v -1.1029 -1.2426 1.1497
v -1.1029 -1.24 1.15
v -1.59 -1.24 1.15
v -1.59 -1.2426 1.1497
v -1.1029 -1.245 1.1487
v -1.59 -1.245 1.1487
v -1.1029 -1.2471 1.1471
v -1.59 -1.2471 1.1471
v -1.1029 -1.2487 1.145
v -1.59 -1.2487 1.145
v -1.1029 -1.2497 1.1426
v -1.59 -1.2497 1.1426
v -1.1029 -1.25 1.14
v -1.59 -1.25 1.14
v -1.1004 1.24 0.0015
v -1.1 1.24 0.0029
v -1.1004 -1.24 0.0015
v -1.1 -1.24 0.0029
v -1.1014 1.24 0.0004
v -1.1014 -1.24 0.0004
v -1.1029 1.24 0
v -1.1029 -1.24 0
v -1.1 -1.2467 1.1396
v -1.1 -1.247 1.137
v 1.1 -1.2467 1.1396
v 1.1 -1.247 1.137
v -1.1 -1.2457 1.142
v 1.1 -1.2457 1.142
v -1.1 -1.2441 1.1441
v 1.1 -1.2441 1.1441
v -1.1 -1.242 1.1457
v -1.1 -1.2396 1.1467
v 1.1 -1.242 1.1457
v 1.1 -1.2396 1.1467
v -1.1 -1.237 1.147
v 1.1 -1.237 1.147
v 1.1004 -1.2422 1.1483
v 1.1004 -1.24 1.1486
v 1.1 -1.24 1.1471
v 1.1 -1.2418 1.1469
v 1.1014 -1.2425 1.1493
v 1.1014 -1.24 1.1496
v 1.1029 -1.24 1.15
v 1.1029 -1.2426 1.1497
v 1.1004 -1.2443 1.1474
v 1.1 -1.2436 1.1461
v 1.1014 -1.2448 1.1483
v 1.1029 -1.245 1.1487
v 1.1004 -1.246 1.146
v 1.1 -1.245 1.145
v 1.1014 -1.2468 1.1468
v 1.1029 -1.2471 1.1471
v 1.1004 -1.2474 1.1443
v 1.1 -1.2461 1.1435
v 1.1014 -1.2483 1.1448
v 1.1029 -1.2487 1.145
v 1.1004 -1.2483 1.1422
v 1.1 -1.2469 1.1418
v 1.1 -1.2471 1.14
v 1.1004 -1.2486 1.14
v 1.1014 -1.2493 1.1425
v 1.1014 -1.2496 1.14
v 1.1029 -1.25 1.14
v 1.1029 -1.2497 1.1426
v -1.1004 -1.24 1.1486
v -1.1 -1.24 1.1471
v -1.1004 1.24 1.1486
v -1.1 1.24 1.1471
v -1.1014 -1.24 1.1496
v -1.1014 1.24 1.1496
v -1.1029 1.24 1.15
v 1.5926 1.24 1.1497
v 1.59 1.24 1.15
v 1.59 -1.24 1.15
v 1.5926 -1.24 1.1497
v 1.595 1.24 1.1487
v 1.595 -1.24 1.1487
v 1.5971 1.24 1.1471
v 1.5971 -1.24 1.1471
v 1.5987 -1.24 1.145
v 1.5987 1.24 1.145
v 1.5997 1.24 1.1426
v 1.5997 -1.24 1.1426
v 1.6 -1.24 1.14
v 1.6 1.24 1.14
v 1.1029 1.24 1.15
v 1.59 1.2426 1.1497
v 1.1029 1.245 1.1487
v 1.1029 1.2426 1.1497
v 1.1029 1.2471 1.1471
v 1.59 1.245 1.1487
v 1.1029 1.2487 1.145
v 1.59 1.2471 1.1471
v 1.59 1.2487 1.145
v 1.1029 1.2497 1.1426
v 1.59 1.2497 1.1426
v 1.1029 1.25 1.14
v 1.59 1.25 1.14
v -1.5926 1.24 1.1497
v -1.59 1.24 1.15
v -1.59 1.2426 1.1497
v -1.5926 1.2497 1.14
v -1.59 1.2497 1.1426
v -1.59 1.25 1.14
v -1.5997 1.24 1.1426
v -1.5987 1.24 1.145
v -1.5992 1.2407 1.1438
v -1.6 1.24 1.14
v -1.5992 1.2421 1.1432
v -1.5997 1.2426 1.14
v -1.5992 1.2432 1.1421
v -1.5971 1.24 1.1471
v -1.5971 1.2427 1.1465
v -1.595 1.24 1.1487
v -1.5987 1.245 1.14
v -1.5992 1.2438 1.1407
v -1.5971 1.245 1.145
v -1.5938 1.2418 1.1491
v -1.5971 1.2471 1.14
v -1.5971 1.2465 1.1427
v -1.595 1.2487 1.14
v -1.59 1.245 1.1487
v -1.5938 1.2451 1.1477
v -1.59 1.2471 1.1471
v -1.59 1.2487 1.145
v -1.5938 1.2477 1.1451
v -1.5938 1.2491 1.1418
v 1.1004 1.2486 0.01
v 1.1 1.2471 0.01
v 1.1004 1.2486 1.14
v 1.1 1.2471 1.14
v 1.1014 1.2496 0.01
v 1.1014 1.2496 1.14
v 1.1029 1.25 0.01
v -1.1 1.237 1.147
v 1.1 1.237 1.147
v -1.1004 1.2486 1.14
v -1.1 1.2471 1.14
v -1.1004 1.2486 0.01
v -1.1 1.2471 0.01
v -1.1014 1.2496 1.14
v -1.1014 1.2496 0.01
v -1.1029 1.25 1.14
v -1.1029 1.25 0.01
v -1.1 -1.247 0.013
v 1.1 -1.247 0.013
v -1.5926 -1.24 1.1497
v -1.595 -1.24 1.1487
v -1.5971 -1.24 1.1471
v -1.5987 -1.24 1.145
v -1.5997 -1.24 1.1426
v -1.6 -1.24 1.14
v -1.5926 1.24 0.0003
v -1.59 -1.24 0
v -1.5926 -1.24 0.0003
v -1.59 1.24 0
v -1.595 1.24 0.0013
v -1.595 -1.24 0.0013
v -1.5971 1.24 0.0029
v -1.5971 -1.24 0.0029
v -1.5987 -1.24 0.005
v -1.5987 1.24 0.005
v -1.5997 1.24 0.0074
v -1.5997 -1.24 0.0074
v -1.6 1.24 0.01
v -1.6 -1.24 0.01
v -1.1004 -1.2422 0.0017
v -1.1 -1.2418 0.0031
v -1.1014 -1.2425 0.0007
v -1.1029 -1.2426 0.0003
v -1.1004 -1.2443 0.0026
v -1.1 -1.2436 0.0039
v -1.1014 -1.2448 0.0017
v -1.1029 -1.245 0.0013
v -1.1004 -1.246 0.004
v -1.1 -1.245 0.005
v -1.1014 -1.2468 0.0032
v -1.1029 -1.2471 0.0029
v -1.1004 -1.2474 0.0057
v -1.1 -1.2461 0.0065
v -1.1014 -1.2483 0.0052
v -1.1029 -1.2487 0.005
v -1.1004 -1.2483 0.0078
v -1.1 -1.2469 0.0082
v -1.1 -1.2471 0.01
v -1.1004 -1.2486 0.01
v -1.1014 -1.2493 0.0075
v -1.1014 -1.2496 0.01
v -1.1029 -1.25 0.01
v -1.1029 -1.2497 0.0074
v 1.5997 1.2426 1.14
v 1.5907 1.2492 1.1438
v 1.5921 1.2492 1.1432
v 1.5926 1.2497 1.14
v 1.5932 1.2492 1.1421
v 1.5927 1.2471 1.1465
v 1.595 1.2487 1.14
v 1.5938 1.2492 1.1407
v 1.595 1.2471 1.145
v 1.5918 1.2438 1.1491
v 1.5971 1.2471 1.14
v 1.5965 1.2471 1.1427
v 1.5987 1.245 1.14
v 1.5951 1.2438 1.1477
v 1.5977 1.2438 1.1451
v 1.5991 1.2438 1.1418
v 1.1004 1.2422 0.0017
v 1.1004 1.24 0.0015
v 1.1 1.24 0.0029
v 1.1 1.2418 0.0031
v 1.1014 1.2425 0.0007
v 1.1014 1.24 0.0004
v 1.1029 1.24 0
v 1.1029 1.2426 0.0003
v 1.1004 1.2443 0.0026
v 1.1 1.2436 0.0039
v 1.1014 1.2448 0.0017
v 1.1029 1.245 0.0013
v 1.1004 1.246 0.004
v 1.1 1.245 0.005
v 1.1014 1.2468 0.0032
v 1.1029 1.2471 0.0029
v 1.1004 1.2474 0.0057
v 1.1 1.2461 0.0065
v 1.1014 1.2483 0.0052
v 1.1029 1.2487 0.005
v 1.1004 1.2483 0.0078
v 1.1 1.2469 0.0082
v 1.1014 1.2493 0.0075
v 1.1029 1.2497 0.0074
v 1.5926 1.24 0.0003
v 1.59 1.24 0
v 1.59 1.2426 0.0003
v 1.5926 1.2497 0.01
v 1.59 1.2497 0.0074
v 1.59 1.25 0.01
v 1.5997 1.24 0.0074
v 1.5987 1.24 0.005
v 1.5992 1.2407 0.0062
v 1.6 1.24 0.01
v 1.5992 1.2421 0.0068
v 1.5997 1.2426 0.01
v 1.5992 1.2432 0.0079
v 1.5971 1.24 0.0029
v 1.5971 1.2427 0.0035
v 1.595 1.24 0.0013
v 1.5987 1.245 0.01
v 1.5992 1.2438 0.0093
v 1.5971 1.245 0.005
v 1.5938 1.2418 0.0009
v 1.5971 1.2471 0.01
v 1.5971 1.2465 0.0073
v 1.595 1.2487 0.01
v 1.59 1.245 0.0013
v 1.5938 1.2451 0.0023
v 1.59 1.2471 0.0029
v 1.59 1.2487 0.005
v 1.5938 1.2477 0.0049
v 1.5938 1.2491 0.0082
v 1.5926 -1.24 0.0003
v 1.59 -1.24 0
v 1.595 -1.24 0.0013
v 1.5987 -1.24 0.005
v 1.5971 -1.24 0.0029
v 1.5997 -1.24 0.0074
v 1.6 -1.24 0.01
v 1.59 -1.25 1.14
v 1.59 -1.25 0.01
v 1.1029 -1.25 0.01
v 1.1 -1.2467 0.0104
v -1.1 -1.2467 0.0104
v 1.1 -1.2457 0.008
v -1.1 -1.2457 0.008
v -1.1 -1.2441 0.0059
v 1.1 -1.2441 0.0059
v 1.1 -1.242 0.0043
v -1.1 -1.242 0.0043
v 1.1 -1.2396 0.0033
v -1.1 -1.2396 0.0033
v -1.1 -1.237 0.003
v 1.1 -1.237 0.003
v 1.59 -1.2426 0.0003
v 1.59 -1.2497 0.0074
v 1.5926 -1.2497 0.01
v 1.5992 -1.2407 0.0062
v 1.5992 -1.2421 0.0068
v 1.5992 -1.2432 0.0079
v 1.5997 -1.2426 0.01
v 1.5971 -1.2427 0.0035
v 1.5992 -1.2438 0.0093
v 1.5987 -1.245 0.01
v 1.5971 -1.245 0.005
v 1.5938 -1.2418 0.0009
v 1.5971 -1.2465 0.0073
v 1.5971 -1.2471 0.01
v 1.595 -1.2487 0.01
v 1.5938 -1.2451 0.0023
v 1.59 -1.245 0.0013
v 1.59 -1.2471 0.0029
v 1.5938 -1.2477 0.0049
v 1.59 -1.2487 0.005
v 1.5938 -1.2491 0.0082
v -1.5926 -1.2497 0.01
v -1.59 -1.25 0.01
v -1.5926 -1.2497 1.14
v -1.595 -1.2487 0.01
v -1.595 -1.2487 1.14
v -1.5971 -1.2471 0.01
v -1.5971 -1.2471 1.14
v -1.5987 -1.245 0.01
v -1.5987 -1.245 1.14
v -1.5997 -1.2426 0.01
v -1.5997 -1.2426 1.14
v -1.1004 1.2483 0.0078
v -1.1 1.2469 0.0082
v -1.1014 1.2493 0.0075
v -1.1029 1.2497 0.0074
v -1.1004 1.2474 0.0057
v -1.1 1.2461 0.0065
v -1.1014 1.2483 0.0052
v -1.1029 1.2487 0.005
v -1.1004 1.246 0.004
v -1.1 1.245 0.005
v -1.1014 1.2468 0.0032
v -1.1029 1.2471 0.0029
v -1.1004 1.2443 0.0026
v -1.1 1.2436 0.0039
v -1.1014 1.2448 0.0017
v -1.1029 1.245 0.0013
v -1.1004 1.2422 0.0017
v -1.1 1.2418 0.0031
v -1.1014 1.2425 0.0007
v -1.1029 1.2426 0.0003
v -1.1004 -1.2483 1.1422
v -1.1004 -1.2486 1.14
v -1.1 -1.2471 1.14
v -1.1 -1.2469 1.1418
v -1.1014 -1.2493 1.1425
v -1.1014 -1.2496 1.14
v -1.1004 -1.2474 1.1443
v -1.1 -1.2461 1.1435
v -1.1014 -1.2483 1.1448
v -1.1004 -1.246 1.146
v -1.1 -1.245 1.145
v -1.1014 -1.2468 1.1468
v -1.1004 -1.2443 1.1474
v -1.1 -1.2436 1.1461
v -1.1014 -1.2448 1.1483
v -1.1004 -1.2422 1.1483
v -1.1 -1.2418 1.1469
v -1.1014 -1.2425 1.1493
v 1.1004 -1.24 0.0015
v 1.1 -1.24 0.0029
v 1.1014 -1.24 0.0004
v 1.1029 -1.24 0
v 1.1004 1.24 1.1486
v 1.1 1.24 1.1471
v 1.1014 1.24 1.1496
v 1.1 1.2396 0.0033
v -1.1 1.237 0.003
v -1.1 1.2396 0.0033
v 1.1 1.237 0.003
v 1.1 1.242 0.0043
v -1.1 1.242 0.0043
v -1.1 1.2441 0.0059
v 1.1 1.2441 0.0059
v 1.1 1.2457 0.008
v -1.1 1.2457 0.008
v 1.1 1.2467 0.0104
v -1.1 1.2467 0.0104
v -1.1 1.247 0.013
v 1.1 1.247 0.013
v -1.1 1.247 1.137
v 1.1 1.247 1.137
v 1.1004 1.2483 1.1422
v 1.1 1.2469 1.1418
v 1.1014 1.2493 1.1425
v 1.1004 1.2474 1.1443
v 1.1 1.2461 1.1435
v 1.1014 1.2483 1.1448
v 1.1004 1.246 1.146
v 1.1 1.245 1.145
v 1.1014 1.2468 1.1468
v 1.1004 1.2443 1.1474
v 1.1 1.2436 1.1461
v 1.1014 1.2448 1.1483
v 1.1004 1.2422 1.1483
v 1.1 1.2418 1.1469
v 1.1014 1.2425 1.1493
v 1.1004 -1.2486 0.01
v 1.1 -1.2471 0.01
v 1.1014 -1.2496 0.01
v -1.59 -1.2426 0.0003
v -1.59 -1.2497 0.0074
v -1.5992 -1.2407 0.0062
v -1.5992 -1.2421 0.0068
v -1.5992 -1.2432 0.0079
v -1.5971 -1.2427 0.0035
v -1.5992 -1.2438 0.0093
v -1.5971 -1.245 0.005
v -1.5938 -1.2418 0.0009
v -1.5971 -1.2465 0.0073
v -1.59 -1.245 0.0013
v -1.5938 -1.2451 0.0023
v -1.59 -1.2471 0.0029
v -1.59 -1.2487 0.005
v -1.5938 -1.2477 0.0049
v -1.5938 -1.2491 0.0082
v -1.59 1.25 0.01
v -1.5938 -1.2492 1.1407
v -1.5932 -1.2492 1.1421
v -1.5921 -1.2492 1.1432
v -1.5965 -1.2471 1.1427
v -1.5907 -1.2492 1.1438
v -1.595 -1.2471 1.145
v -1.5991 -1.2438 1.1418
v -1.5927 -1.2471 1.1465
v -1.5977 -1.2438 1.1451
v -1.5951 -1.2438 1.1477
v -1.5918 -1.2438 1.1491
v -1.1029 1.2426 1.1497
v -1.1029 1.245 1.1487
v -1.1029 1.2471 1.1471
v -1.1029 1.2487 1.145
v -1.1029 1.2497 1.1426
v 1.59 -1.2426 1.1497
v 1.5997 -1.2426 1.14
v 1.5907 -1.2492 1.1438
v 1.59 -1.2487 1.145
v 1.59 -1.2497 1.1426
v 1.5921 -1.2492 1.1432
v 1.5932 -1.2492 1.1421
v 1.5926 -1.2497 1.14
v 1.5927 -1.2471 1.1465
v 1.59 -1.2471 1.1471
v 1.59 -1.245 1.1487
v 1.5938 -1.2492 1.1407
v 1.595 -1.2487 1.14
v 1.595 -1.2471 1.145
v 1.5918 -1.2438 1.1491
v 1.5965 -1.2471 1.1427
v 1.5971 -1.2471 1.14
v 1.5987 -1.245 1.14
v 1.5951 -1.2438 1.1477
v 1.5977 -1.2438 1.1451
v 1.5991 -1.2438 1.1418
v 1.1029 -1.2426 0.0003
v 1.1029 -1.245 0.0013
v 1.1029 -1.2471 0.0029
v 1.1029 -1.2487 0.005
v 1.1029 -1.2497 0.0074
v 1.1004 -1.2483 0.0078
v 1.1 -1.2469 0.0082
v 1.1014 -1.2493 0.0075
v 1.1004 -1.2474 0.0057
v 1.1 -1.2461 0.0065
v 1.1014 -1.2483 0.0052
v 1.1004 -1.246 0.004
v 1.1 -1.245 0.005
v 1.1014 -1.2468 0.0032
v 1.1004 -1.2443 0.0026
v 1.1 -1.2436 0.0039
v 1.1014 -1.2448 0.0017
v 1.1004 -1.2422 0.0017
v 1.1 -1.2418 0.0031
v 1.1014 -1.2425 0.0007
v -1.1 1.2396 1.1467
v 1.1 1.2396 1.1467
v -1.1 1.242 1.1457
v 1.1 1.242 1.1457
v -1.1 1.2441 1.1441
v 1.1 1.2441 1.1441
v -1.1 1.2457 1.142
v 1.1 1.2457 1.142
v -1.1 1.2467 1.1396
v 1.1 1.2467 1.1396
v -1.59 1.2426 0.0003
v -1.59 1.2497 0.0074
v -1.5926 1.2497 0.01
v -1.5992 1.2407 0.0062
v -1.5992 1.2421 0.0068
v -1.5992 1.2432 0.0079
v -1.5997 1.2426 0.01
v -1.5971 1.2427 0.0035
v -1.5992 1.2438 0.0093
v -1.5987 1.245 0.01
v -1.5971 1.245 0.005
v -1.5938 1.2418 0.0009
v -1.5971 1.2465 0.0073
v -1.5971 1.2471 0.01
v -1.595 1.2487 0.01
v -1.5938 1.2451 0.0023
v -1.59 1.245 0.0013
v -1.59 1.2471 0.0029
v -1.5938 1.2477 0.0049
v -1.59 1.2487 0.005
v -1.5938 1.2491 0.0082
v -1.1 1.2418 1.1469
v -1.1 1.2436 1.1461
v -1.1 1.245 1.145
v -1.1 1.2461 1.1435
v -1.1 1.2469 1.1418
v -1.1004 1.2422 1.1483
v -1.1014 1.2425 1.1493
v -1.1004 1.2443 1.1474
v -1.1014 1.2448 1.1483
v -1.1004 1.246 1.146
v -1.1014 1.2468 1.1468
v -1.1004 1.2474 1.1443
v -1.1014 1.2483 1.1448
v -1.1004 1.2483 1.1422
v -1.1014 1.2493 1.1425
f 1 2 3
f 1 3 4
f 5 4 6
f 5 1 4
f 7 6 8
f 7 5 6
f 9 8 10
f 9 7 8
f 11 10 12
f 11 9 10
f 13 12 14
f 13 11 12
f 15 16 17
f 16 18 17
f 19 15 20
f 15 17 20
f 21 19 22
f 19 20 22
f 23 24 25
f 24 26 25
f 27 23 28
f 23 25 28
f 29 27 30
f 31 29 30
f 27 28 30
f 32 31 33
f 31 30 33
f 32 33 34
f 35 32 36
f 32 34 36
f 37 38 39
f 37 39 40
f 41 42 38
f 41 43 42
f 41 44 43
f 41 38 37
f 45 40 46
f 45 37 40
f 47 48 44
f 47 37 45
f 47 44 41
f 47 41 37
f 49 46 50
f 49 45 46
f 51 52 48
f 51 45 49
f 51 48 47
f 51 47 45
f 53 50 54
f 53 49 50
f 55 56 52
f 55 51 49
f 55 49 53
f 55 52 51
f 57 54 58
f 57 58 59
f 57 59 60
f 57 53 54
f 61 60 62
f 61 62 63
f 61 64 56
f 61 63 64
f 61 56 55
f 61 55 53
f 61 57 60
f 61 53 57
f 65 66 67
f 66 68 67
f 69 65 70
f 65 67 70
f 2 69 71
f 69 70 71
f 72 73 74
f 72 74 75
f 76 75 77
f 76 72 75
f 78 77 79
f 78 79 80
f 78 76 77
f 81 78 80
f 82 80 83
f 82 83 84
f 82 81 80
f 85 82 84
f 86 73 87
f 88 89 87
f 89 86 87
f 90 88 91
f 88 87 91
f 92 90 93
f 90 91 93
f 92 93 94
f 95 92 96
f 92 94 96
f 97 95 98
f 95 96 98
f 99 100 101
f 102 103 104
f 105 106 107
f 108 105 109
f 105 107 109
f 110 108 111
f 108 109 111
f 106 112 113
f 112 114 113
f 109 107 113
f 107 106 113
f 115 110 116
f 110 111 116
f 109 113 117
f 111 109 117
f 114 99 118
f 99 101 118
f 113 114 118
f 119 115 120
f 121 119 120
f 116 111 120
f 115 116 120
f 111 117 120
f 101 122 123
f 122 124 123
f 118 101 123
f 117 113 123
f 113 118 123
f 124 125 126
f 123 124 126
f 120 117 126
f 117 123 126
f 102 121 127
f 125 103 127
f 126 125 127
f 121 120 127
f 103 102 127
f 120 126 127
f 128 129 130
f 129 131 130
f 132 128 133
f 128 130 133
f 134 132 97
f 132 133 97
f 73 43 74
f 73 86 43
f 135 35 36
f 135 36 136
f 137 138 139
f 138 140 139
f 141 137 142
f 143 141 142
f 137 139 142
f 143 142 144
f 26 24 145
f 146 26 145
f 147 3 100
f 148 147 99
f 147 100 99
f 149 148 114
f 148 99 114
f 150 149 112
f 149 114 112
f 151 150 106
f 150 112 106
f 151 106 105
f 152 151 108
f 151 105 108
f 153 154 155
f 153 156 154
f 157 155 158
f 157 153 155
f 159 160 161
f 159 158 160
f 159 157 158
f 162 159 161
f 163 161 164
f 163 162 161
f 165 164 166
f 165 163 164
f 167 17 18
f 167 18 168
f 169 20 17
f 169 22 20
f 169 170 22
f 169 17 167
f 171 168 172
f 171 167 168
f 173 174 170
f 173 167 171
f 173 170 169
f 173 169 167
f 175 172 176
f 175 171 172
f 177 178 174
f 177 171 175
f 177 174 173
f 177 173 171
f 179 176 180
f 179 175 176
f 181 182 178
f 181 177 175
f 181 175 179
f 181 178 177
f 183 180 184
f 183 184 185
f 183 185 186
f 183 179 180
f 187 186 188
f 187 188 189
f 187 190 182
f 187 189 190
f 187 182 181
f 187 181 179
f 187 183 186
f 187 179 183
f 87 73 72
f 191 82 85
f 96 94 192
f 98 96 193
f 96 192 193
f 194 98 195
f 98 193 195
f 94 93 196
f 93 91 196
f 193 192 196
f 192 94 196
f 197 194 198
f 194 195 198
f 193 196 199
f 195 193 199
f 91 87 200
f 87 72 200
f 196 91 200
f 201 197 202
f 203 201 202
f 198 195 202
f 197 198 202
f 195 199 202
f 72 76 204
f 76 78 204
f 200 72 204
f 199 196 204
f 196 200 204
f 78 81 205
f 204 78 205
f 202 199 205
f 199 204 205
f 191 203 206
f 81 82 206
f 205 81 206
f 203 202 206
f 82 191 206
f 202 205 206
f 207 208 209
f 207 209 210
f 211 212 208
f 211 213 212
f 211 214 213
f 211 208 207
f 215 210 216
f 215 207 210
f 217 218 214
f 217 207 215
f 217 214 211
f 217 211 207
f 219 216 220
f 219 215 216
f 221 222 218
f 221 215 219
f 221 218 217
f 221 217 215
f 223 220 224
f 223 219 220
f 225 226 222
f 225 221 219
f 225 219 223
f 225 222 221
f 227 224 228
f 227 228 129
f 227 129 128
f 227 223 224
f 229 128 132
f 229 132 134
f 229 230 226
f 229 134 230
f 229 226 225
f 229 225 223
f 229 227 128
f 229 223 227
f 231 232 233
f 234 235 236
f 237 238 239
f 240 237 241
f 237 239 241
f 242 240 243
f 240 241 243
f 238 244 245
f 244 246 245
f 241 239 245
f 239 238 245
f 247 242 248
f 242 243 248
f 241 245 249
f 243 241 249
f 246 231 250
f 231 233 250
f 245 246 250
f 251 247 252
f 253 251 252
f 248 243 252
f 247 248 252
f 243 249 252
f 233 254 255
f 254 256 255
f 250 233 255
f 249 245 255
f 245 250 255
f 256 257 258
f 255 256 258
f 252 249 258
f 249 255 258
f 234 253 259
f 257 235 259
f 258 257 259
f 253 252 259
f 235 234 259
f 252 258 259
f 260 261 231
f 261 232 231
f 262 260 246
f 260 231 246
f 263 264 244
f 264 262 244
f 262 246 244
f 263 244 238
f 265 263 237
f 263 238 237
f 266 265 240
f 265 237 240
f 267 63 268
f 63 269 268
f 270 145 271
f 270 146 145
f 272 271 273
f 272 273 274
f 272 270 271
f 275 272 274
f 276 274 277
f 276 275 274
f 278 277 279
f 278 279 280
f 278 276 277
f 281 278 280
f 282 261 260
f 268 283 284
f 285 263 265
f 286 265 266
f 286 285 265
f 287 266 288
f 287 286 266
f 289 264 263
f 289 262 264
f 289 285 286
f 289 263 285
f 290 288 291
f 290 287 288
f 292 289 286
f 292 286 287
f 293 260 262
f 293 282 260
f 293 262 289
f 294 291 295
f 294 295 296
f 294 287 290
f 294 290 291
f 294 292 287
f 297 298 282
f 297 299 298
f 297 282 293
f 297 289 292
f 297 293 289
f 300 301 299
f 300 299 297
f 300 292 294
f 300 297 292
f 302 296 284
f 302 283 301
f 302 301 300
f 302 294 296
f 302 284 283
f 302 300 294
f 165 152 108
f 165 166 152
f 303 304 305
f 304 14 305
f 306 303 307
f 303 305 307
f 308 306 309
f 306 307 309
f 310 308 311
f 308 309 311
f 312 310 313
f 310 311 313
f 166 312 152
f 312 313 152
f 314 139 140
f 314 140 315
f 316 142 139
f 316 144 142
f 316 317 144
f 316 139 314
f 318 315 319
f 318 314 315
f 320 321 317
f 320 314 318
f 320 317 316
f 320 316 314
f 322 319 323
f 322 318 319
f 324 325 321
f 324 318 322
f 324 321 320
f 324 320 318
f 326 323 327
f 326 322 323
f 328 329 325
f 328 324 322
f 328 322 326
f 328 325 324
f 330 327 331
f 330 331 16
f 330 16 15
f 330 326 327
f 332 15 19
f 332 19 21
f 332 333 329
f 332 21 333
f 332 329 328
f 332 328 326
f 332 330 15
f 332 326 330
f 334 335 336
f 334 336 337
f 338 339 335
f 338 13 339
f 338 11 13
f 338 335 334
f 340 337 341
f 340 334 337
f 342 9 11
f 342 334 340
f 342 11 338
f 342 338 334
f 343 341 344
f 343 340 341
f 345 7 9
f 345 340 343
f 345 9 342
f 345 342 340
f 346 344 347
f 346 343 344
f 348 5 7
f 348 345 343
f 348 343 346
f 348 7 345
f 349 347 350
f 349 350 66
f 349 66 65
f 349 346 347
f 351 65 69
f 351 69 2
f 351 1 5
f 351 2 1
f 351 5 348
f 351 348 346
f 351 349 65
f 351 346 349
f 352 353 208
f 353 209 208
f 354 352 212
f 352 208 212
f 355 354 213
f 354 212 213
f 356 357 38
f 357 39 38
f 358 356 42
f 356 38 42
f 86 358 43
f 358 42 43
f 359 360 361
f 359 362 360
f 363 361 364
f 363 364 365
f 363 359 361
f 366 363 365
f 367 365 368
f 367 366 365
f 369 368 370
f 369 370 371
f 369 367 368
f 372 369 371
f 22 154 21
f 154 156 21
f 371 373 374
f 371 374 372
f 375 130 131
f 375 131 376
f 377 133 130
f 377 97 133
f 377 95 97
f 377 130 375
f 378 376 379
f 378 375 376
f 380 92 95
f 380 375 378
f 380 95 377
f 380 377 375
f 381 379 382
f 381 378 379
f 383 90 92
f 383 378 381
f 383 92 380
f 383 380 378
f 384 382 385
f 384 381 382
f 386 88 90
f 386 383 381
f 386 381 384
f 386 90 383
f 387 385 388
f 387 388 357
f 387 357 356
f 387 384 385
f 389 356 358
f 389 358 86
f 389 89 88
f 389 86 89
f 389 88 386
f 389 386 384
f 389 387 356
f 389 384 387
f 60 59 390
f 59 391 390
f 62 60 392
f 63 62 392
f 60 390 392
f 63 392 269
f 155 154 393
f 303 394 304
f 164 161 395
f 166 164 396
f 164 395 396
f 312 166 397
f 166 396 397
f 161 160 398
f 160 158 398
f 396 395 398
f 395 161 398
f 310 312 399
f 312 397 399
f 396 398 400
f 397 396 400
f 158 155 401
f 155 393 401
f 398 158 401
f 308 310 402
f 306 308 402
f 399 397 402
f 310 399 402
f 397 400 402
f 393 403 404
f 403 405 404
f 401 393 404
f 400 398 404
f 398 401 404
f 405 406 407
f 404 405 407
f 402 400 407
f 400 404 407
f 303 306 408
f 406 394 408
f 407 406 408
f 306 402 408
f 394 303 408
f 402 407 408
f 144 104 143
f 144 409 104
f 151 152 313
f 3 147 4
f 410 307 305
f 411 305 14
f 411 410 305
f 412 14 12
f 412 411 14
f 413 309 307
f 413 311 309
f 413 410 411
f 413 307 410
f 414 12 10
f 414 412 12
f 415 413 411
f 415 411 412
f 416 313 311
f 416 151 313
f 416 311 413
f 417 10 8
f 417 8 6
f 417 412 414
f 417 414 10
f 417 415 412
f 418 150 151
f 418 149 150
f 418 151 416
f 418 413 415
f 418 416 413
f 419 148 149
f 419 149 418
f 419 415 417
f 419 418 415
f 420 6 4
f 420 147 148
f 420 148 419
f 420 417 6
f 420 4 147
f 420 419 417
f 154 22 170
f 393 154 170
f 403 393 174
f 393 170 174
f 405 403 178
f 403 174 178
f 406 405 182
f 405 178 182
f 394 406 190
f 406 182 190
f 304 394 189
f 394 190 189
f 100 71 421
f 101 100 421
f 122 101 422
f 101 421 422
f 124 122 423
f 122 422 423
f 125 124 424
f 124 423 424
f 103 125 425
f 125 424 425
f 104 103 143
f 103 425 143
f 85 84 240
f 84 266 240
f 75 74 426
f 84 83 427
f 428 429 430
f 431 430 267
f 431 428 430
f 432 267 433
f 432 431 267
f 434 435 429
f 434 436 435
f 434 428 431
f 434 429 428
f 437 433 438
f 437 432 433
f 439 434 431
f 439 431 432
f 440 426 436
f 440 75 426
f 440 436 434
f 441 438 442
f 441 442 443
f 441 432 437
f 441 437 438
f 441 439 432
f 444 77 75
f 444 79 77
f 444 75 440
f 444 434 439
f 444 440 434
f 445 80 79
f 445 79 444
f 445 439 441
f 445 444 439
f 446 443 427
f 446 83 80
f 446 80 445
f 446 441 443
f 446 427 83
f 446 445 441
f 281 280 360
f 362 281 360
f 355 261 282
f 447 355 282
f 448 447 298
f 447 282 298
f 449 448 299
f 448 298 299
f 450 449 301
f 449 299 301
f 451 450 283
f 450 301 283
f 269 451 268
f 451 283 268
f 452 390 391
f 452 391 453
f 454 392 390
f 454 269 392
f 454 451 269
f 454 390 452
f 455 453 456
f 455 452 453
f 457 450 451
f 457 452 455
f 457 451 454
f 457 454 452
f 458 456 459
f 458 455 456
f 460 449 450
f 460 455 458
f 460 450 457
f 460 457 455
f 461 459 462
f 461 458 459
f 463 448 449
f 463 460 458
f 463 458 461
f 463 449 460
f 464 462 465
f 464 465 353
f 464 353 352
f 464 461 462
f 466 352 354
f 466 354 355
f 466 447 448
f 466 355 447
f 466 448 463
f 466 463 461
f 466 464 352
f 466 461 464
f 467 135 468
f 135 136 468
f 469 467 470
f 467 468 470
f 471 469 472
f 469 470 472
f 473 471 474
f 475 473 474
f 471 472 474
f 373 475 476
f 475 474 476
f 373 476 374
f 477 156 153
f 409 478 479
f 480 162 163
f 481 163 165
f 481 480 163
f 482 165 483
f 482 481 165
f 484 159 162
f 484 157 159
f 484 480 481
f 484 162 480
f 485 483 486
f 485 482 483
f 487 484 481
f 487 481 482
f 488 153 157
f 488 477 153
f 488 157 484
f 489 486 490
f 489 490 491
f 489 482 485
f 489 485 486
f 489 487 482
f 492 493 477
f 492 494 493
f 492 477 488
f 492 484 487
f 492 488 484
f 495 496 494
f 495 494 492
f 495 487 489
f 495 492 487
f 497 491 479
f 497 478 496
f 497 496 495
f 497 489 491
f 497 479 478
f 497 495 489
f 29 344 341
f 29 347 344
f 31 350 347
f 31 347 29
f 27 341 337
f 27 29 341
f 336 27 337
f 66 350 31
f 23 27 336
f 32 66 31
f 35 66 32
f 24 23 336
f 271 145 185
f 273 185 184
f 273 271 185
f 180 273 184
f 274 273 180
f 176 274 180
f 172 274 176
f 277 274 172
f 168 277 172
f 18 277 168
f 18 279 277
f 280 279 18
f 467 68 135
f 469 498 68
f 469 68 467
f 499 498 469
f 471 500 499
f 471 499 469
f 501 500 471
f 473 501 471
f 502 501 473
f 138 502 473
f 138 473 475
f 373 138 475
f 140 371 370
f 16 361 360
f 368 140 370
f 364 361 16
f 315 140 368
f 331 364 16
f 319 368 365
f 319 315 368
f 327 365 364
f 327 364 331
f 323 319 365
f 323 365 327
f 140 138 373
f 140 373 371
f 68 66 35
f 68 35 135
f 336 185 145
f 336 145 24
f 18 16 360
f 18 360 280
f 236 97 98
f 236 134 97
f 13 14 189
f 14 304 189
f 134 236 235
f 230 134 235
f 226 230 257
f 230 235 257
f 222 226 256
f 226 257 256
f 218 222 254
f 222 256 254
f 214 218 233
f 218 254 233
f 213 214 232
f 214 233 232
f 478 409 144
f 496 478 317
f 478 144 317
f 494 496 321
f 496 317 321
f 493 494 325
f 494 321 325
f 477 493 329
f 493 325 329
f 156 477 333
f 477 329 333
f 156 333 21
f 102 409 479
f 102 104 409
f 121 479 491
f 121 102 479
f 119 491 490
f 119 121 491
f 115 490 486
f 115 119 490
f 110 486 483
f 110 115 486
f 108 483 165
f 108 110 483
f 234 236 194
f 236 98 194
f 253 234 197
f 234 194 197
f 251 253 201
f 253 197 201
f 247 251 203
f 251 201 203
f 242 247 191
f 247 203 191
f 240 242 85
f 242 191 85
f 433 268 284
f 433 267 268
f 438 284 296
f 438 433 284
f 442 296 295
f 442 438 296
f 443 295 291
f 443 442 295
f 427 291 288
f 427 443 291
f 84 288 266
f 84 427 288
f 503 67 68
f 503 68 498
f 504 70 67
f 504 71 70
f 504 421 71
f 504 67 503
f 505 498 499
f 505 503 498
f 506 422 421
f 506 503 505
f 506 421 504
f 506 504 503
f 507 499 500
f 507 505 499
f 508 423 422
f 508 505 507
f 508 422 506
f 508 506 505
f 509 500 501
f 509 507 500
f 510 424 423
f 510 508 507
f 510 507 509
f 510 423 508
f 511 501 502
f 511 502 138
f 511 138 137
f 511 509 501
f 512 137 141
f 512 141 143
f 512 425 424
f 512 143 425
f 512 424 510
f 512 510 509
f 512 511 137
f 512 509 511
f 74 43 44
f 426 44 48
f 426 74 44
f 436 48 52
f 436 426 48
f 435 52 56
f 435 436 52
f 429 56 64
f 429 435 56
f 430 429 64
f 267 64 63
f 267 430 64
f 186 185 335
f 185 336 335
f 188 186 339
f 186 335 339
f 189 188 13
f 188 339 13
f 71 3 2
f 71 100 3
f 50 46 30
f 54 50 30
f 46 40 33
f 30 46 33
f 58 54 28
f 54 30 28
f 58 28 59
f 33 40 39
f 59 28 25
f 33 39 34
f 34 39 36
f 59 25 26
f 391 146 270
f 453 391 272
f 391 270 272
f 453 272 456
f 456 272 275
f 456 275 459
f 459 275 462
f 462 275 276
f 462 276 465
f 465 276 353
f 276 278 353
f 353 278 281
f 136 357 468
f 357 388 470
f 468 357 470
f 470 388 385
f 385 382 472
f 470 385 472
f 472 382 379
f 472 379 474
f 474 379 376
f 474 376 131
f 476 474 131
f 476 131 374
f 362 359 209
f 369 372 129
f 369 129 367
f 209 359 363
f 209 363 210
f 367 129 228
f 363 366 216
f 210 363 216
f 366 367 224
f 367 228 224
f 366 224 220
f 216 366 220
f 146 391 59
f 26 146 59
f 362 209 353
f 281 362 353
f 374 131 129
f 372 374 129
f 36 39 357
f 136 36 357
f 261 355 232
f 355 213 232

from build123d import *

# Parameters (mm, degrees)
SKETCH1_W                           = 3.2
SKETCH1_H                           = 2.5
ALL_BODY_DEPTH                      = 1.15
CUT_OUT_THE_BODY_FOR_PIN_DEPTH      = 1.1
CUT_OUT_THE_BODY_FOR_PIN_DEPTH_BACK = 1.1
SKETCH2_OUTSIDE_W                   = 3.994
SKETCH2_OUTSIDE_H                   = 5.344
SKETCH2_OUTSIDE_W_2                 = 1.144
SKETCH2_OUTSIDE_H_2                 = 2.494
BODY_FILLET_R                       = 0.01
PIN_FILLET_A_R                      = 0.01
PIN_FILLET_B_R                      = 0.003


with BuildPart() as part:
    # Sketch1 → All body (new body)
    with BuildSketch(Plane.XY):
        Rectangle(SKETCH1_W, SKETCH1_H)
    extrude(amount=ALL_BODY_DEPTH)

    # Sketch2 outside → Cut out the body for pin (cut, two sides: drawn at the far end of the back side and taken through both)
    with BuildSketch(Plane(origin=(0, 0, 0), x_dir=(0, 0, -1), z_dir=(1, 0, 0)).offset(-CUT_OUT_THE_BODY_FOR_PIN_DEPTH_BACK)):
        with Locations((-0.575, 0)):
            Rectangle(SKETCH2_OUTSIDE_W, SKETCH2_OUTSIDE_H)
        with Locations((-0.575, 0)):
            Rectangle(SKETCH2_OUTSIDE_W_2, SKETCH2_OUTSIDE_H_2, mode=Mode.SUBTRACT)
    extrude(amount=CUT_OUT_THE_BODY_FOR_PIN_DEPTH + CUT_OUT_THE_BODY_FOR_PIN_DEPTH_BACK, mode=Mode.SUBTRACT)

    # Body fillet
    body_fillet_edges = [part.edges().sort_by_distance(p)[0] for p in [
        (0, 1.247, 0.003),
        (0, 1.247, 1.147),
        (0, -1.247, 1.147),
        (0, -1.247, 0.003),
    ]]
    fillet(body_fillet_edges, radius=BODY_FILLET_R)

    # Pin fillet a
    pin_fillet_a_edges = [part.edges().sort_by_distance(p)[0] for p in [
        (1.6, 0, 1.15),
        (-1.35, 1.25, 0),
        (1.35, -1.25, 0),
        (1.35, -1.25, 1.15),
        (-1.35, 1.25, 1.15),
        (1.35, 1.25, 1.15),
        (-1.6, 0, 1.15),
        (1.35, 1.25, 0),
        (1.6, 0, 0),
        (-1.35, -1.25, 0),
        (-1.6, 0, 0),
        (-1.6, 1.25, 0.575),
        (1.6, 1.25, 0.575),
        (1.6, -1.25, 0.575),
        (-1.6, -1.25, 0.575),
        (-1.35, -1.25, 1.15),
    ]]
    fillet(pin_fillet_a_edges, radius=PIN_FILLET_A_R)

    # Pin fillet b
    pin_fillet_b_edges = [part.edges().sort_by_distance(p)[0] for p in [
        (1.1, -1.25, 0.575),
        (1.1, 0, 1.15),
        (1.1, 1.25, 0.575),
        (1.1, 0, 0),
        (-1.1, 1.25, 0.575),
        (-1.1, 0, 1.15),
        (-1.1, -1.25, 0.575),
        (-1.1, 0, 0),
        (1.1, 1.247071068, 0.002928932),
        (1.1, -1.247071068, 0.002928932),
        (1.1, -1.247071068, 1.147071068),
        (1.1, 1.247071068, 1.147071068),
        (-1.1, -1.247071068, 1.147071068),
        (-1.1, 1.247071068, 1.147071068),
        (-1.1, -1.247071068, 0.002928932),
        (-1.1, 1.247071068, 0.002928932),
    ]]
    fillet(pin_fillet_b_edges, radius=PIN_FILLET_B_R - 0.0001)  # a hair under: the kernel refuses the full size


solid = part.part
